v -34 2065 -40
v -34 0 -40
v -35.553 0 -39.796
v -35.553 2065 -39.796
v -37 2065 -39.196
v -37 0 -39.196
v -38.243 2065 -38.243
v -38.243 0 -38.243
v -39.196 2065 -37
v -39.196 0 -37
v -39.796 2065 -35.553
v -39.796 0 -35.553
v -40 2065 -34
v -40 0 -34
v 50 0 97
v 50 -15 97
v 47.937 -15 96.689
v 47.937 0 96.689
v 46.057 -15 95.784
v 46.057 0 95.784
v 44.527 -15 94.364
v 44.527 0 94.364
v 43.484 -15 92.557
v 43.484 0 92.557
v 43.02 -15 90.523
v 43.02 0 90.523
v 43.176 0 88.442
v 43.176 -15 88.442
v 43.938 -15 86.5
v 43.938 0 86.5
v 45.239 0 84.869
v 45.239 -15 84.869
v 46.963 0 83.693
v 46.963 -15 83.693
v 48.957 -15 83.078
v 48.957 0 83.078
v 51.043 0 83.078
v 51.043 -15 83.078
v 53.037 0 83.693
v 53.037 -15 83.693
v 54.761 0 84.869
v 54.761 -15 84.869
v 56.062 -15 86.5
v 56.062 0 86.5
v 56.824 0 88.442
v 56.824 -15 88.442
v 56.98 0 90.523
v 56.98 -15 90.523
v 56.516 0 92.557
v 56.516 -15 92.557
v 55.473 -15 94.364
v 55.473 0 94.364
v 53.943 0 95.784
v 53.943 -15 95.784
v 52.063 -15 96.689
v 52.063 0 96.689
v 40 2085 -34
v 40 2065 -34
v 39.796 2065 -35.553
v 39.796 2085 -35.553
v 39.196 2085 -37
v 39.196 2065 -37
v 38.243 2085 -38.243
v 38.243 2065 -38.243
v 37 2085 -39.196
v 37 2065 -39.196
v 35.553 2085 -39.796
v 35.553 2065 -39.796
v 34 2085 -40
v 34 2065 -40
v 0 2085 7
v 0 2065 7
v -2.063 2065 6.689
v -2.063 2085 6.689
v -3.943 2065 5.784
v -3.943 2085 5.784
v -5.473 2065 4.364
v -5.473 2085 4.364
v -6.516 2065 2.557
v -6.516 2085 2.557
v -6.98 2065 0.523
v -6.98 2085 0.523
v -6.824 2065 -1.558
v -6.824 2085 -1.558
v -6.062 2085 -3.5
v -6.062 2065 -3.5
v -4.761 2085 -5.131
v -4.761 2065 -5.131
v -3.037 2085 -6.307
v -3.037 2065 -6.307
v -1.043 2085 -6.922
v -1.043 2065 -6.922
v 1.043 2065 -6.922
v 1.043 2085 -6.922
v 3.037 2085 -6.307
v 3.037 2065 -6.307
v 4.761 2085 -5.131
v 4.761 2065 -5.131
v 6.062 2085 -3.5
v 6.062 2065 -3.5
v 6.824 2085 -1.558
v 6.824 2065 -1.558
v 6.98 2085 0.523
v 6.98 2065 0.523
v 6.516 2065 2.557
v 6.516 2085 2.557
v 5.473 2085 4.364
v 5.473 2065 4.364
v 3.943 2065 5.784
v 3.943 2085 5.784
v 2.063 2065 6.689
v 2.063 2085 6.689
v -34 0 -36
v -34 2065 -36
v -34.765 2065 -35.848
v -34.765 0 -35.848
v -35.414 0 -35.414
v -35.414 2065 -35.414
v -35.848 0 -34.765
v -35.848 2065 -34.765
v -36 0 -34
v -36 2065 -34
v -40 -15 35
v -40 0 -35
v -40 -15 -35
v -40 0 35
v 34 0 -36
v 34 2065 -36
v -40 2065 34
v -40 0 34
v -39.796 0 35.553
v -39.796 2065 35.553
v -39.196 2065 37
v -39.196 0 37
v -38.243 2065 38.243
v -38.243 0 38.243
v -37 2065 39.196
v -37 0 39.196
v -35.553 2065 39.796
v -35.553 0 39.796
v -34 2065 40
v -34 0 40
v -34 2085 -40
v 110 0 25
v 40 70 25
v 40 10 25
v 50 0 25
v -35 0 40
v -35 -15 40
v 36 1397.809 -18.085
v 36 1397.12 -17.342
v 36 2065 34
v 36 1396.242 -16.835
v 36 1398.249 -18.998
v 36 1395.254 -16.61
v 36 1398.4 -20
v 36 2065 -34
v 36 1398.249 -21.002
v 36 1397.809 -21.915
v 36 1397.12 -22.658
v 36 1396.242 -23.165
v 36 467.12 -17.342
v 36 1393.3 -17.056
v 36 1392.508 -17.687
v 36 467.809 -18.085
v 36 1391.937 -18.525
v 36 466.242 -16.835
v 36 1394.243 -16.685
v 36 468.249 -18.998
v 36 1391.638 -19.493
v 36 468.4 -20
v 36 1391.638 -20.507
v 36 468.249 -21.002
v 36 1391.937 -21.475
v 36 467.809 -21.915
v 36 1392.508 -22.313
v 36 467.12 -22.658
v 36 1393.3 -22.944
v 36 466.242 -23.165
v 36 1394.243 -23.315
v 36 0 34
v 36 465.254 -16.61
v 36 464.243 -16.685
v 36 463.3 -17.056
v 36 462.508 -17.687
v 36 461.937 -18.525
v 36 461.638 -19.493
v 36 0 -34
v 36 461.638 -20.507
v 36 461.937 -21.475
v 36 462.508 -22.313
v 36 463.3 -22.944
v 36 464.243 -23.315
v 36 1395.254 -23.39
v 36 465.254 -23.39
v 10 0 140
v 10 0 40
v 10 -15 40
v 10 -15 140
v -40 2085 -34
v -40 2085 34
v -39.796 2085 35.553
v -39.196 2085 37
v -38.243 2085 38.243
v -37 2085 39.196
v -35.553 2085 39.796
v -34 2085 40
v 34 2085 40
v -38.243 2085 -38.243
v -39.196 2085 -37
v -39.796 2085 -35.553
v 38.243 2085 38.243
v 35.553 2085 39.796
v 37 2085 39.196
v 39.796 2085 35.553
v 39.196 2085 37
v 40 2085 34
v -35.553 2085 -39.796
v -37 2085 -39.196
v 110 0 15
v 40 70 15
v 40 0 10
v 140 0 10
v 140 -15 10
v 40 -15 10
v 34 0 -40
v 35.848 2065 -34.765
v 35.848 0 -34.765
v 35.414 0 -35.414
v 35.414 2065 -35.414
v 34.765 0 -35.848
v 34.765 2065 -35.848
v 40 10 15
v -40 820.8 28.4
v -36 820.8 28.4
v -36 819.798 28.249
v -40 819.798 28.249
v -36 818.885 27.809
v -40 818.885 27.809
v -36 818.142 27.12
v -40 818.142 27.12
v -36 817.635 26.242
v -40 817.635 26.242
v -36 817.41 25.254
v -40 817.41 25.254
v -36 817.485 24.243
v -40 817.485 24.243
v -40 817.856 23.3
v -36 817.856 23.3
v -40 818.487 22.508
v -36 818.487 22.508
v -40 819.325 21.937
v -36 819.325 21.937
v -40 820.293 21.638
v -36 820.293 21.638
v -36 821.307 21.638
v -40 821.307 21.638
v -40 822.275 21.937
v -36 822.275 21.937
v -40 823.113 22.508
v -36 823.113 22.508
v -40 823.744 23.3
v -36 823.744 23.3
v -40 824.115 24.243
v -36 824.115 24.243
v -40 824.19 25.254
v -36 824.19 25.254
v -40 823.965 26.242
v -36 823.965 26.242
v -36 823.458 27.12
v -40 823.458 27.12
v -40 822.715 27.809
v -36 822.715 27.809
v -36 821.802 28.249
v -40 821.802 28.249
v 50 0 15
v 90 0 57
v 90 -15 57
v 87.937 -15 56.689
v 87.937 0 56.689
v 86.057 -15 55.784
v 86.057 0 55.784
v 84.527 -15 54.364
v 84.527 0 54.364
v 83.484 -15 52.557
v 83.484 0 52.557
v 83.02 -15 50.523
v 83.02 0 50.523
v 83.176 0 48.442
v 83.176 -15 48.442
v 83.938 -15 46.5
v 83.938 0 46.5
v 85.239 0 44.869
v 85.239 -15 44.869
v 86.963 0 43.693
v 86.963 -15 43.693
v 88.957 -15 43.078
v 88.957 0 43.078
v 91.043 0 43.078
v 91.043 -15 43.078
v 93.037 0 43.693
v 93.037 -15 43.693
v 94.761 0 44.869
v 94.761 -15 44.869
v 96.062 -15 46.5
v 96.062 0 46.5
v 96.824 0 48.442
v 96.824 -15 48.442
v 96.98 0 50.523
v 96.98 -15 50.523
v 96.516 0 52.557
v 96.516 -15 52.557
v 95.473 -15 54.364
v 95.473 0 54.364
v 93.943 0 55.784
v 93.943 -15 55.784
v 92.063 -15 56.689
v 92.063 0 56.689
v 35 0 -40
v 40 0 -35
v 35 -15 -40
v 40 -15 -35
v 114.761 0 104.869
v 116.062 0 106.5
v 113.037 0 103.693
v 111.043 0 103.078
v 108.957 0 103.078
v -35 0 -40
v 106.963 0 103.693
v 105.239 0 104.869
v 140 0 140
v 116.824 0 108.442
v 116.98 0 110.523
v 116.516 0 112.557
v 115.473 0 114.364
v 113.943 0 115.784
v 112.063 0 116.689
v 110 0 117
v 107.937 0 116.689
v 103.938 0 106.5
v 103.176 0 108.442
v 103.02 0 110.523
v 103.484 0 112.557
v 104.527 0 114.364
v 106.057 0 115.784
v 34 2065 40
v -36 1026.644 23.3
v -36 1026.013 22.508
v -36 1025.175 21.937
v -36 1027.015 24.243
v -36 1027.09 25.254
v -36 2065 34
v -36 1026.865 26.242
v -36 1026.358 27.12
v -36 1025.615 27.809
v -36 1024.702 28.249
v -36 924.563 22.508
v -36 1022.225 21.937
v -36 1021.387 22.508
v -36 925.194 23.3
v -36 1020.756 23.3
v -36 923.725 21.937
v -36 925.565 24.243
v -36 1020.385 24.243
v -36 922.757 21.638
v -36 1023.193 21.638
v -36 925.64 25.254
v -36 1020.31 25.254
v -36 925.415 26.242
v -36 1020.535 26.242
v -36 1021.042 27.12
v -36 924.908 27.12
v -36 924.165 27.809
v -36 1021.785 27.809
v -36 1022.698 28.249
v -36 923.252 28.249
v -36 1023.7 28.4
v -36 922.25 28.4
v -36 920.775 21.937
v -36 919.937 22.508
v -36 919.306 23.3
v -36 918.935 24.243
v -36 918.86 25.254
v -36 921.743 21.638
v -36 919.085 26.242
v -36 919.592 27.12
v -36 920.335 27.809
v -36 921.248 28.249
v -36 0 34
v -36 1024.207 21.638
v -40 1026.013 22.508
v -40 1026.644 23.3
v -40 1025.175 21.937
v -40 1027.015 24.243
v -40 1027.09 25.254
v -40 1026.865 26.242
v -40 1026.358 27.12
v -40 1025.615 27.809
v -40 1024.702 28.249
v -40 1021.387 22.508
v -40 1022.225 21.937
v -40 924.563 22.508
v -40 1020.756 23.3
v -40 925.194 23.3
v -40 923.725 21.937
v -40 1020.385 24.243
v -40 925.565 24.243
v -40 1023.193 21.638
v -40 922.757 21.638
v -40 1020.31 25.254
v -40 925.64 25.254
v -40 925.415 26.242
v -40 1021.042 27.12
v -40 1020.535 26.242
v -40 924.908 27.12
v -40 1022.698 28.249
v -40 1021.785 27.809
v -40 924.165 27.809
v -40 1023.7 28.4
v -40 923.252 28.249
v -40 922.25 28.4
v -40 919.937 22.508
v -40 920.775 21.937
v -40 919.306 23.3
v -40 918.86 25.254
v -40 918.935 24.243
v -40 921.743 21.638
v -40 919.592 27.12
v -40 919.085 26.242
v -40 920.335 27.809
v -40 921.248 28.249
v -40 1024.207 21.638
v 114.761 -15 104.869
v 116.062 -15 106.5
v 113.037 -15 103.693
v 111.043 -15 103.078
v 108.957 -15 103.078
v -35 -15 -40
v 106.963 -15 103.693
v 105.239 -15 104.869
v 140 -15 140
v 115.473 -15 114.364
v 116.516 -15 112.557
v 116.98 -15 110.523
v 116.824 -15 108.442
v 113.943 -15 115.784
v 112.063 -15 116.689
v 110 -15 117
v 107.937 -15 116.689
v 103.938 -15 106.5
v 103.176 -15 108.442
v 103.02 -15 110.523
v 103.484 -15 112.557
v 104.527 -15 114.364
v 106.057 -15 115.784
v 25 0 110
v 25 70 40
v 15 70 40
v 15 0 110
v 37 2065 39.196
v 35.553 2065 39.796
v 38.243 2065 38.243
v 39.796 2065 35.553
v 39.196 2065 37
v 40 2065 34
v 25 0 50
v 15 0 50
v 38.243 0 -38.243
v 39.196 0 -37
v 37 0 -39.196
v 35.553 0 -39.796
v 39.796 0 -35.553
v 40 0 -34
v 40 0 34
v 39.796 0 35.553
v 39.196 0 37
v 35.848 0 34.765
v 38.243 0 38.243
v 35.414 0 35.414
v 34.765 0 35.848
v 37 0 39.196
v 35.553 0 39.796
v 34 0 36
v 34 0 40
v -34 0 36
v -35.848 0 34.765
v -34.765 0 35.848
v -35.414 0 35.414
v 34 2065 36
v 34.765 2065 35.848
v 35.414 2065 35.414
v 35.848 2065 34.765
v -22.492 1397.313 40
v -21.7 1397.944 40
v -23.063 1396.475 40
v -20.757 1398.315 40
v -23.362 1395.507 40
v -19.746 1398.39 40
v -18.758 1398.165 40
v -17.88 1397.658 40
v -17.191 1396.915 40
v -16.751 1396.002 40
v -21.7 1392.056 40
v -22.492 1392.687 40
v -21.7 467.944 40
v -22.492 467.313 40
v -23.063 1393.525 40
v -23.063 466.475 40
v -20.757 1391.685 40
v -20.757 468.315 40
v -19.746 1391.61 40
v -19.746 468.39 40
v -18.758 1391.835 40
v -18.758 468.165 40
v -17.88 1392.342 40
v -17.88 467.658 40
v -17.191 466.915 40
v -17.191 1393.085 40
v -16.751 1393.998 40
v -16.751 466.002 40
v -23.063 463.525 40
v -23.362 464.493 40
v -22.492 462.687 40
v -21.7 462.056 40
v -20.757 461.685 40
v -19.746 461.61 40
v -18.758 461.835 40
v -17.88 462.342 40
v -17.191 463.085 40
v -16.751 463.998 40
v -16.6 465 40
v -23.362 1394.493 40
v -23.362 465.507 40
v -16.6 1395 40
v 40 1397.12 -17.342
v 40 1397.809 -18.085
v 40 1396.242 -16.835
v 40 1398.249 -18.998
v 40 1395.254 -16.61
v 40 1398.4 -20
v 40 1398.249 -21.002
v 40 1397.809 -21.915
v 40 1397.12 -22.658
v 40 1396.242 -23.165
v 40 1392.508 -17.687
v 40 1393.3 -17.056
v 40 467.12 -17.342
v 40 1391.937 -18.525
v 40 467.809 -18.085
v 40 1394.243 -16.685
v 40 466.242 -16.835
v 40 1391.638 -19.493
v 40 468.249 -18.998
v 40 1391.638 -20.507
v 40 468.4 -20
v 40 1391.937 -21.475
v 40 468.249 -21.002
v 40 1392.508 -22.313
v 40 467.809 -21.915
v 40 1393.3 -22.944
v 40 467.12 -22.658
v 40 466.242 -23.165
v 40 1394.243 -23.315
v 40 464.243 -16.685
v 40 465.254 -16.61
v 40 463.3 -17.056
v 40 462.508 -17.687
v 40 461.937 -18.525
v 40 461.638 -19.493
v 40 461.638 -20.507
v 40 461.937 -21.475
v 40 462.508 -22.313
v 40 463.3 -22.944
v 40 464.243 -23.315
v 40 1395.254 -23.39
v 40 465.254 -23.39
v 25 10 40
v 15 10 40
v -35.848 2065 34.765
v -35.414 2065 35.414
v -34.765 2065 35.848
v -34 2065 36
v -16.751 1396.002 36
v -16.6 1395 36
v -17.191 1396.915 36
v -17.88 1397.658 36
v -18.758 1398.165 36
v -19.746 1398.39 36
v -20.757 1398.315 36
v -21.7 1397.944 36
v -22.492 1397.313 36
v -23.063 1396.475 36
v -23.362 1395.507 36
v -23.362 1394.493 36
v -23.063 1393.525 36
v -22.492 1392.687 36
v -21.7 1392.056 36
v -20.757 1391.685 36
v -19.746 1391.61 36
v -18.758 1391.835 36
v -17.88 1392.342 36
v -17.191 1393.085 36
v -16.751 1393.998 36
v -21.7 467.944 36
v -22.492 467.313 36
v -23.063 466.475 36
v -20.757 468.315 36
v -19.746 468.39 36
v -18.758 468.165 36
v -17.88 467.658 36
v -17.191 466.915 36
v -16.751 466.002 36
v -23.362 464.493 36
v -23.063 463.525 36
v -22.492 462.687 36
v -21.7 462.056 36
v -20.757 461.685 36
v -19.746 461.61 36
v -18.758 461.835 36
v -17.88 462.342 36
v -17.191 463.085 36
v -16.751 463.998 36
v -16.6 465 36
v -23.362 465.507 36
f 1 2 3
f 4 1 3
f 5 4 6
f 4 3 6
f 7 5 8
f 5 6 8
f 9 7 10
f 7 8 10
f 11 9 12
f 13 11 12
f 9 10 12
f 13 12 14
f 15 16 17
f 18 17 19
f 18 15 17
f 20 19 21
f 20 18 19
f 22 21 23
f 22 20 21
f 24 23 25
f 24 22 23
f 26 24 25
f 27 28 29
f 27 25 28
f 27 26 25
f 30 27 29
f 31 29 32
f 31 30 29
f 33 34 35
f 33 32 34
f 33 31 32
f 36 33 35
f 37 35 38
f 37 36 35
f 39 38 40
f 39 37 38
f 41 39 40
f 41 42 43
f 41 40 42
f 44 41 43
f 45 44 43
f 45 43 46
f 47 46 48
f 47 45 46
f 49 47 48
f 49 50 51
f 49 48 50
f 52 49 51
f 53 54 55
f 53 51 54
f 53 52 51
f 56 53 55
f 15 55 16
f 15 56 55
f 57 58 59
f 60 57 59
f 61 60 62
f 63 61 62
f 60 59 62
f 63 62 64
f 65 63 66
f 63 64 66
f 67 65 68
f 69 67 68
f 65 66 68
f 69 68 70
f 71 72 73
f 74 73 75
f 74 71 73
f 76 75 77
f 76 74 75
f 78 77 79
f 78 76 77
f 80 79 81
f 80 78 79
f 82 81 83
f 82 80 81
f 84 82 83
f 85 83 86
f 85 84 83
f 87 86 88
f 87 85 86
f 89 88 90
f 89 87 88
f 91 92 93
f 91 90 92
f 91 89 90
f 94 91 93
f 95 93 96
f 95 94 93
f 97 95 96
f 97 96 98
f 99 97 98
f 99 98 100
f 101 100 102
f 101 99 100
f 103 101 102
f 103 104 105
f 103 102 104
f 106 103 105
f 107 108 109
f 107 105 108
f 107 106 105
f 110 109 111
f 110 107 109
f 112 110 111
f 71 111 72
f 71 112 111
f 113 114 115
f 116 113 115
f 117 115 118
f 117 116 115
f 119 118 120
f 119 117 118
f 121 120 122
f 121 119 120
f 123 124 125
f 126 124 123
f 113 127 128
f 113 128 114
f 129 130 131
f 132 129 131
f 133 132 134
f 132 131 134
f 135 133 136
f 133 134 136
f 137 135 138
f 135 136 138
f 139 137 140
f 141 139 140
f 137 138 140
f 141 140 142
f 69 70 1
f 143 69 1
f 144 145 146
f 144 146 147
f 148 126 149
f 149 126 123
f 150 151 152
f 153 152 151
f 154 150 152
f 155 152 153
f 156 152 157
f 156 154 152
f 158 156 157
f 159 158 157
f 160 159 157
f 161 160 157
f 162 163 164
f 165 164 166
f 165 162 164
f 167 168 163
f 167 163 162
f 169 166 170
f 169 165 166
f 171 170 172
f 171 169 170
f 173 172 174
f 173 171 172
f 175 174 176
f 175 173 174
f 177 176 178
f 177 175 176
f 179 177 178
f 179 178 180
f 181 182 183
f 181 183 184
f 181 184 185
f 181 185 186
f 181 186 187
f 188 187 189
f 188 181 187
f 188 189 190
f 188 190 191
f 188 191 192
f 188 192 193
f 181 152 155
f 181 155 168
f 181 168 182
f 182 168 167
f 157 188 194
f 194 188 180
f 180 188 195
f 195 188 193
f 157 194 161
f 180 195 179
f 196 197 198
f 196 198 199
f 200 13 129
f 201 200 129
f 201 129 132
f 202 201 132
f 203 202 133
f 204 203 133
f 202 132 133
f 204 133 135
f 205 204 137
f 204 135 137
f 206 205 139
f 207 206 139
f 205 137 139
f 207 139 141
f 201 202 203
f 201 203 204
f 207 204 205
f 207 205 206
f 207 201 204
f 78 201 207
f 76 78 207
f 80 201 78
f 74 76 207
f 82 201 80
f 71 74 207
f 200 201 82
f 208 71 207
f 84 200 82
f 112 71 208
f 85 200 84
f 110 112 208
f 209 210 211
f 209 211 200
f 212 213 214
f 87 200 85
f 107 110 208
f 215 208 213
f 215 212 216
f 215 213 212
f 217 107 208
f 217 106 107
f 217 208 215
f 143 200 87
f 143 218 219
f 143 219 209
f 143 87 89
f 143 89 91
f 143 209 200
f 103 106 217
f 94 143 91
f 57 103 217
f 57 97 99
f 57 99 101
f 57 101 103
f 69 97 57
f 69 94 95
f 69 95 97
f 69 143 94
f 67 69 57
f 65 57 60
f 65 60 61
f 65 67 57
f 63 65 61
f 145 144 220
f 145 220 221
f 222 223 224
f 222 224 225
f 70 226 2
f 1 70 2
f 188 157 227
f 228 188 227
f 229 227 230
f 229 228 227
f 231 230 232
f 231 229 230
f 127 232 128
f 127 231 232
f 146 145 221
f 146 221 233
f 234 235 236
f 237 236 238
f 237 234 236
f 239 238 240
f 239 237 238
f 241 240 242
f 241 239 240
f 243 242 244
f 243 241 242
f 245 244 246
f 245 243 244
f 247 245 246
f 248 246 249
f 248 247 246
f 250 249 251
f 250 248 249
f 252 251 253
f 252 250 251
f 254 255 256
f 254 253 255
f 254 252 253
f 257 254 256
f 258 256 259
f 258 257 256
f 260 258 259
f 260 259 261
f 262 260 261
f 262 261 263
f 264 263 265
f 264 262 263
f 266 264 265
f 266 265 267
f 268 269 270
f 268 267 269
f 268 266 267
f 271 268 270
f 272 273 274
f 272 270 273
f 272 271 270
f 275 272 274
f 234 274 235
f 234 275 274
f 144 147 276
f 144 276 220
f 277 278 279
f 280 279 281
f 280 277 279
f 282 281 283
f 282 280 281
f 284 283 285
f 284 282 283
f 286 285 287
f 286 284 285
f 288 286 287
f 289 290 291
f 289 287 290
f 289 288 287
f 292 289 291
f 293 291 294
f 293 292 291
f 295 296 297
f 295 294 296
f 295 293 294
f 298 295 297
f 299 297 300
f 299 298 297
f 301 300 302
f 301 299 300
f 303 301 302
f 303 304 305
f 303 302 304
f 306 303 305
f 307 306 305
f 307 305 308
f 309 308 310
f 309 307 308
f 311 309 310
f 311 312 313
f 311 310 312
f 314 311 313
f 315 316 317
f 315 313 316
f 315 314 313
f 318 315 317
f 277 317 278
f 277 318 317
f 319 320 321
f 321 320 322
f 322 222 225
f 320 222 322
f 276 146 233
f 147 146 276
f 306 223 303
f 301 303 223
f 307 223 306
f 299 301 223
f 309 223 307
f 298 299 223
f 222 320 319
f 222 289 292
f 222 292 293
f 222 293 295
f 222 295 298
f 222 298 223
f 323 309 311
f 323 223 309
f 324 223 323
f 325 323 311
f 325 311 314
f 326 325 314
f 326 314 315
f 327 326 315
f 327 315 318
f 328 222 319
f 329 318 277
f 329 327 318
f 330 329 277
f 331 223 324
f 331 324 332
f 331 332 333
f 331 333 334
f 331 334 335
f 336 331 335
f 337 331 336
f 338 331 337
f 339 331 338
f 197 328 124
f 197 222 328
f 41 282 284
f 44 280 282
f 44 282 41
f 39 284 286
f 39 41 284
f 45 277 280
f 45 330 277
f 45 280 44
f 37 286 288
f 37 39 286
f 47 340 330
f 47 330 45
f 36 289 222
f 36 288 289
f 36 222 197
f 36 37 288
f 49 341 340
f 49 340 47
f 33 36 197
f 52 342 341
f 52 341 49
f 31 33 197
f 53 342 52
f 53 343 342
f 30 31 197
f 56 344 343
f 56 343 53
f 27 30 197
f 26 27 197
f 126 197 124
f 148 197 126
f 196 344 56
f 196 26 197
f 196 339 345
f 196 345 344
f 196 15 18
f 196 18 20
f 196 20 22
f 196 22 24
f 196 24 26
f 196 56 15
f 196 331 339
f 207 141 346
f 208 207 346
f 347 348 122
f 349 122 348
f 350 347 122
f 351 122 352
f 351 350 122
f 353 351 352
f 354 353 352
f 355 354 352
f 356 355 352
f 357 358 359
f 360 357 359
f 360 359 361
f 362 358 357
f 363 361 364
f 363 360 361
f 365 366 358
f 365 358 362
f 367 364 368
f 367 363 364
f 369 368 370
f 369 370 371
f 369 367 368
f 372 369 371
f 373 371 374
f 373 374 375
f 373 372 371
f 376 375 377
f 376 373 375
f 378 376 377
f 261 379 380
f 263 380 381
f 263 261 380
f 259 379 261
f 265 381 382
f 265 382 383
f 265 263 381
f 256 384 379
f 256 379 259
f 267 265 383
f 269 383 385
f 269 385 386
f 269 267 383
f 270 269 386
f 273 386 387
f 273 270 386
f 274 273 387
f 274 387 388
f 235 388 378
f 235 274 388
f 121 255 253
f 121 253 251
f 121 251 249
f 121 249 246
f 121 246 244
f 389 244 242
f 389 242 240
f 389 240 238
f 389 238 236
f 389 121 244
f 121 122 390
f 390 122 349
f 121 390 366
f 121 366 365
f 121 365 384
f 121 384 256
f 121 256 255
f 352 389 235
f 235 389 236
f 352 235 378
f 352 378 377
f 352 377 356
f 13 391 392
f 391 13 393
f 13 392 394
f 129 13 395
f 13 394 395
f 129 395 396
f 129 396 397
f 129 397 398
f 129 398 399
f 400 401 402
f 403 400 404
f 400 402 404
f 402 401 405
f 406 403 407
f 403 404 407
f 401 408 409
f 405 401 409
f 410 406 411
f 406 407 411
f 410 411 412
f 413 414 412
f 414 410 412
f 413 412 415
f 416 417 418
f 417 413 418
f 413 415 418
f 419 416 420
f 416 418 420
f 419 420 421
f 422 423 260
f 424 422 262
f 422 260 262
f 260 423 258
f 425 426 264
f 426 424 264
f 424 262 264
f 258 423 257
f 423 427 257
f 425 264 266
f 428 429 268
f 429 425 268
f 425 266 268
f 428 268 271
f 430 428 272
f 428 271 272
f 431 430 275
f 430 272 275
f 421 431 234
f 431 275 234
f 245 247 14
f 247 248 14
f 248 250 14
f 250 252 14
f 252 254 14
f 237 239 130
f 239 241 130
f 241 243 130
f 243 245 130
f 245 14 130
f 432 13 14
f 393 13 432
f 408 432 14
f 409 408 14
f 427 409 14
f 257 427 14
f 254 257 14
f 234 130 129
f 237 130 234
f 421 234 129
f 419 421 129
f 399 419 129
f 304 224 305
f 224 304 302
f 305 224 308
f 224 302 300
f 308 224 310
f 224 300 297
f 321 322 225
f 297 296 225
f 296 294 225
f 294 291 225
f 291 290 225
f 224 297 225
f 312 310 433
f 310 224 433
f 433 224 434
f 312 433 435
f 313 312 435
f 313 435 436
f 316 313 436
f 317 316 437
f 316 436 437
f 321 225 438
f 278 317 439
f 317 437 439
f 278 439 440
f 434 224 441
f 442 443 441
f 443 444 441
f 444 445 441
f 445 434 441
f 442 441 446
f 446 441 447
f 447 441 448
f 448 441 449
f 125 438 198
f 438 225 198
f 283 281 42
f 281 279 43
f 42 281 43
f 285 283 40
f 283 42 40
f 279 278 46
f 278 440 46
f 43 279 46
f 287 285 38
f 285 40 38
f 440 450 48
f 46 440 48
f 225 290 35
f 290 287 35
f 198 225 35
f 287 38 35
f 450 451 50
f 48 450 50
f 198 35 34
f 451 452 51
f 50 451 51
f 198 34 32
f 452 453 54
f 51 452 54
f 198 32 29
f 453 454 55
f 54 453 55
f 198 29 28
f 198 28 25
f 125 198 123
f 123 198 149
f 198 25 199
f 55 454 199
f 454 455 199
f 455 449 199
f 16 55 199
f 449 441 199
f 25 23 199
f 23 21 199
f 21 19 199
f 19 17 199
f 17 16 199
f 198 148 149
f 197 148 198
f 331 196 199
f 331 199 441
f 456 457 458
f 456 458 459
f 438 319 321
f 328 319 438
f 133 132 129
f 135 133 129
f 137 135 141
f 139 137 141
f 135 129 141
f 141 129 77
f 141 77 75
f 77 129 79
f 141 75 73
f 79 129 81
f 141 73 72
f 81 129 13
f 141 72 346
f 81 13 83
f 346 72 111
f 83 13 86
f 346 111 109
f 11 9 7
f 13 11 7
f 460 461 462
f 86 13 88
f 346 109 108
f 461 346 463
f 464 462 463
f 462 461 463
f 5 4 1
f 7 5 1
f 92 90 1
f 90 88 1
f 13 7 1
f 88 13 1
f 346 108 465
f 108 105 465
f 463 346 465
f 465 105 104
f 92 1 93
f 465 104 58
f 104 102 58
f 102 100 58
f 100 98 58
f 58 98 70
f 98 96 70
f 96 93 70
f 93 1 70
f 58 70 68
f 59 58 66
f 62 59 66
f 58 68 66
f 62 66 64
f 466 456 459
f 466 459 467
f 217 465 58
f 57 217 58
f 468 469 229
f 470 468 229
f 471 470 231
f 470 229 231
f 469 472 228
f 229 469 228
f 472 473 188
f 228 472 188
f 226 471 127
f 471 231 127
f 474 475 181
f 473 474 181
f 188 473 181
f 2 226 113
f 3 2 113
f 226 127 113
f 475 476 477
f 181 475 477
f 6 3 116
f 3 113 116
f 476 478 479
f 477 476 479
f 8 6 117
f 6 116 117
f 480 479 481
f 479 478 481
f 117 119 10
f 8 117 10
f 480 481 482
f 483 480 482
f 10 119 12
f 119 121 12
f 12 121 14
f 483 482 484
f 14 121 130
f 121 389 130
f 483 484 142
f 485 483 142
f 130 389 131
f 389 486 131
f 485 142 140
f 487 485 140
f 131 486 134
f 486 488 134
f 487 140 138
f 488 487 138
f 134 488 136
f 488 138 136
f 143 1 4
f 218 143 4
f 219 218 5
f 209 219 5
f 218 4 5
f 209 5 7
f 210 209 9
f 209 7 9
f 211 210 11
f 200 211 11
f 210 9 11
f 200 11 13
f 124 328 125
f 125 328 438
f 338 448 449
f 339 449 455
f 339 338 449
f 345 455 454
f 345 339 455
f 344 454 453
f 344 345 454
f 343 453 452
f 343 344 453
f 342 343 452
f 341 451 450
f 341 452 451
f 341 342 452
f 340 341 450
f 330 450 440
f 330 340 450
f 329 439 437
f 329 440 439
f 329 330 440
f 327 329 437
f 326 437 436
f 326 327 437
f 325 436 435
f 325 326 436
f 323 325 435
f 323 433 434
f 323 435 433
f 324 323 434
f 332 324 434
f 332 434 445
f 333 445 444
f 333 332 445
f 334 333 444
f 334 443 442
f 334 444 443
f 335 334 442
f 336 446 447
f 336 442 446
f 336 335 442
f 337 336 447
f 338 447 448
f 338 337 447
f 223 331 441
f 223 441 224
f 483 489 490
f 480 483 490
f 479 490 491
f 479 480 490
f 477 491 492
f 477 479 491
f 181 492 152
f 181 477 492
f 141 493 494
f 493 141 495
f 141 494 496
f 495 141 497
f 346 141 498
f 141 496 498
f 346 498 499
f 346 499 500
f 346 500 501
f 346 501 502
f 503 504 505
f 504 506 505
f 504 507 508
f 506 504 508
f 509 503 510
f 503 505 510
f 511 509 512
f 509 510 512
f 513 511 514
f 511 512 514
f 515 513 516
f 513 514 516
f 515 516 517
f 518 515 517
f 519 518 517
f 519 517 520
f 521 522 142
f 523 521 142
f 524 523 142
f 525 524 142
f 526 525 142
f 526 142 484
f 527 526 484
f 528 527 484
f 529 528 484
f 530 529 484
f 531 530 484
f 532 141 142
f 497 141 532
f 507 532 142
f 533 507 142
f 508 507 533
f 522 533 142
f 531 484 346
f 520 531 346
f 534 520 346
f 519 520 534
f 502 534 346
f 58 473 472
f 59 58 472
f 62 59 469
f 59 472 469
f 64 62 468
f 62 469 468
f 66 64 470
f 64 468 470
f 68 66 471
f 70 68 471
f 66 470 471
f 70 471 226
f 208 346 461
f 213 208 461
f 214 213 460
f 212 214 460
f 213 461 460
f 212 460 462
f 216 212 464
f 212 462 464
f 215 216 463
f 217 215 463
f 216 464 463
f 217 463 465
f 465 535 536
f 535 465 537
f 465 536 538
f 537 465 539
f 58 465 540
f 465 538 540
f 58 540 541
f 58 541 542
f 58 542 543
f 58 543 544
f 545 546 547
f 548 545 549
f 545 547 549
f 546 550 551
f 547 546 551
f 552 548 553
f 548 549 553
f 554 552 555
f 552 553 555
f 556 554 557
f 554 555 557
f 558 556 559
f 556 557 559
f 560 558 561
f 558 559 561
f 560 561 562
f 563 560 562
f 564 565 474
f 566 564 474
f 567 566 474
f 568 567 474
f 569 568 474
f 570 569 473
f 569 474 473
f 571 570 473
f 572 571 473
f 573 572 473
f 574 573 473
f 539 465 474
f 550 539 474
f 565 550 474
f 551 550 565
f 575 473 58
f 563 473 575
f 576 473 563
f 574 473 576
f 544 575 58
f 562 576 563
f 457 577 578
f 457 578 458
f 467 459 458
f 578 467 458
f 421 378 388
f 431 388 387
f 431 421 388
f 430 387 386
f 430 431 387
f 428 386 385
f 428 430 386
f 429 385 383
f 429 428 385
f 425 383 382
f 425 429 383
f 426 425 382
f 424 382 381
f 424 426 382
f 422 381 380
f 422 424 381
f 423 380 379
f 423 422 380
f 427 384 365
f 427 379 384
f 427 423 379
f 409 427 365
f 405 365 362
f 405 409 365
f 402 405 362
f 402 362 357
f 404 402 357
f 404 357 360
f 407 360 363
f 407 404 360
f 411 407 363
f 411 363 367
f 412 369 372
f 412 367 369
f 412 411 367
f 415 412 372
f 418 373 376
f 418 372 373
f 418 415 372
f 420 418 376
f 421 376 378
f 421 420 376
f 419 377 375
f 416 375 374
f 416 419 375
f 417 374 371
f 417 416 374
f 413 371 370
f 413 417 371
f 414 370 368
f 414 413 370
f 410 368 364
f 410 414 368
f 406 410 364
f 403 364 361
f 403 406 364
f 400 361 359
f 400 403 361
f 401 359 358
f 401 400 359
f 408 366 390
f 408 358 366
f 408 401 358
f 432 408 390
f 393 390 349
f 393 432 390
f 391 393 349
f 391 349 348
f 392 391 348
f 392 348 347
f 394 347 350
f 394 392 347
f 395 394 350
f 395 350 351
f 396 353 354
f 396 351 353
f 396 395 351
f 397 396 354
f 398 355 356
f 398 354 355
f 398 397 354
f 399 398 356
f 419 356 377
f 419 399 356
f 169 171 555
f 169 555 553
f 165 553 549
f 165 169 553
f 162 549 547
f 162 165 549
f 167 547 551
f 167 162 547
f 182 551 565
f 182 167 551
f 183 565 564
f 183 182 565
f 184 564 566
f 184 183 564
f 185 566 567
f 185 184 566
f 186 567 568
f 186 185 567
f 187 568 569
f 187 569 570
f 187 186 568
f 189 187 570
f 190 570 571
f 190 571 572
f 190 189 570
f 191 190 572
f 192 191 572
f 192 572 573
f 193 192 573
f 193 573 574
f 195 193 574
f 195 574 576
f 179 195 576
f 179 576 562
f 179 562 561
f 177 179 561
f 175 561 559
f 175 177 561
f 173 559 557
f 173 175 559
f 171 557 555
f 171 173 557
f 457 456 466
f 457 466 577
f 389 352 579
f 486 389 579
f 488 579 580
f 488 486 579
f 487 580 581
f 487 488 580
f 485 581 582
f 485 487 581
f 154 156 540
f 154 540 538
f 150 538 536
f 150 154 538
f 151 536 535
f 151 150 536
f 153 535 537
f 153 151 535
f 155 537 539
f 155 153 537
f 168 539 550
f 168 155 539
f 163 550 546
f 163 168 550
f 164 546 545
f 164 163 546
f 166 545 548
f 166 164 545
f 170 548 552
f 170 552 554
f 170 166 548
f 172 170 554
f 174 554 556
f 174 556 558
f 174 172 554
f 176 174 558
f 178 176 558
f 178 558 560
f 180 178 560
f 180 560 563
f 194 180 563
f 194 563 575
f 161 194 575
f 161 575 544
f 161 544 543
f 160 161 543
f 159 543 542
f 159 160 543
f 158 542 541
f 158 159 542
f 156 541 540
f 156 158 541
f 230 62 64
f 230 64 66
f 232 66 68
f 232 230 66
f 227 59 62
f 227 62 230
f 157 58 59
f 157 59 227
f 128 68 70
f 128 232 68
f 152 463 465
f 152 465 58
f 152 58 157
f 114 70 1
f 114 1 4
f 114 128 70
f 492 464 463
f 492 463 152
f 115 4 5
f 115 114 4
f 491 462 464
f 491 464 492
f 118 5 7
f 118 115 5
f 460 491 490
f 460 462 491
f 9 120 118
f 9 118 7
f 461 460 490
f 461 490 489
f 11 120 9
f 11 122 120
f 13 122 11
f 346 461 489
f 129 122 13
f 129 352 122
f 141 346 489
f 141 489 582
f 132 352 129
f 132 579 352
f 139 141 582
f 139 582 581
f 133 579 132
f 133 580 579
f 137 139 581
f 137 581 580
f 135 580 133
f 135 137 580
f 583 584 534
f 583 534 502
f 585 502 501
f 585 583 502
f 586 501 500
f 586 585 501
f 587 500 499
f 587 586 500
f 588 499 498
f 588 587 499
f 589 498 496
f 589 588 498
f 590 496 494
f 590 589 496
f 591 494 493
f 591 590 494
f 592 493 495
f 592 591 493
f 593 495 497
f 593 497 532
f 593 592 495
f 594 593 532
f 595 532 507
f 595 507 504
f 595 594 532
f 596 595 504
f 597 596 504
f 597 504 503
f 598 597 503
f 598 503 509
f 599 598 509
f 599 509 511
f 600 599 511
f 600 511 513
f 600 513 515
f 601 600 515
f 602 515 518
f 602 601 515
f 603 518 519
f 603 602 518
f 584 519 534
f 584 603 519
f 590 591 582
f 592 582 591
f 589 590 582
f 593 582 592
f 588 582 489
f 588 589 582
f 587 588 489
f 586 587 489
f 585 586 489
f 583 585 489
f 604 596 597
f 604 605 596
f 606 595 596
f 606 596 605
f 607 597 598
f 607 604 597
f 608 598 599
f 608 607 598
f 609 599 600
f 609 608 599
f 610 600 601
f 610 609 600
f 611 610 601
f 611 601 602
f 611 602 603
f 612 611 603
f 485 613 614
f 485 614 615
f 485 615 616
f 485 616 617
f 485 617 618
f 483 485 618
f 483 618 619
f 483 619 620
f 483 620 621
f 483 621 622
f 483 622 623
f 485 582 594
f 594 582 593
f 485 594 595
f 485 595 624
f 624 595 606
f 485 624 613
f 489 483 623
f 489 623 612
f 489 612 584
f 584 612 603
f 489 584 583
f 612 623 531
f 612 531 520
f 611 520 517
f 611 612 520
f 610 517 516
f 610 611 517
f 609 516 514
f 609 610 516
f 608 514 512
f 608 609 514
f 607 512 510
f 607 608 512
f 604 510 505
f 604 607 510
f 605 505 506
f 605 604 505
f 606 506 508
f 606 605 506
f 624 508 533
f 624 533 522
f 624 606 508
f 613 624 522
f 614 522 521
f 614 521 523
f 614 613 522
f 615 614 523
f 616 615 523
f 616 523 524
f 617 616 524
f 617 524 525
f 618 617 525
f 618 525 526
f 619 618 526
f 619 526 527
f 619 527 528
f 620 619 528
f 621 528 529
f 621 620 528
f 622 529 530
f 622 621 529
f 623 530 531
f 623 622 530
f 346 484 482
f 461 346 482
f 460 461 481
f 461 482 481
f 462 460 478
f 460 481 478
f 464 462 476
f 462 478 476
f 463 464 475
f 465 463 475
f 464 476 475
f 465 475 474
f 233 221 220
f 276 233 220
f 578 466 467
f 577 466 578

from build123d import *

# Parameters (mm, degrees)
MEMBER_1_DEPTH                   = 2065
EXTRUDE_1_DEPTH                  = 15
HOLE_WIZARD_14_0_14_1_AT_2_COUNT = 2
HOLE_WIZARD_14_0_14_1_AT_2_PITCH = 63.245553203
HOLE_WIZARD_14_0_14_1_AT_3_COUNT = 2
HOLE_WIZARD_14_0_14_1_AT_3_PITCH = 63.245553203
EXTRUDE_2_DEPTH                  = 10
EXTRUDE_3_DEPTH                  = 10
CHAMFER_1_SIZE                   = 5
EXTRUDE_6_DEPTH                  = 20
HOLE_START                       = 36
HOLE_WIZARD_M8_1_OUTLINE_R       = 3.4
HOLE_WIZARD_M8_1_DEPTH           = 4
HOLE_WIZARD_M8_2_OUTLINE_R       = 3.4
HOLE_WIZARD_M8_2_DEPTH           = 4
HOLE_WIZARD_M8_3_AT_2_COUNT      = 2
HOLE_WIZARD_M8_3_AT_2_PITCH      = 101.45
HOLE_WIZARD_M8_3_AT_3_COUNT      = 2
HOLE_WIZARD_M8_3_AT_3_PITCH      = 202.9


# Read off the part's stored shape, not the designer's step: M8 螺纹孔1, M8 螺纹孔2
with BuildPart() as part:
    # Sketch11 → Member 1 (new body)
    with BuildSketch(Plane(origin=(0, 0, 0), x_dir=(-1, 0, 0), z_dir=(0, 1, 0))):
        with BuildLine():
            Line((-34, -40), (34, -40))
            ThreePointArc((34, -40), (38.242640687, -38.242640687), (40, -34))
            Line((40, -34), (40, 34))
            ThreePointArc((40, 34), (38.242640687, 38.242640687), (34, 40))
            Line((34, 40), (-34, 40))
            ThreePointArc((-34, 40), (-38.242640687, 38.242640687), (-40, 34))
            Line((-40, 34), (-40, -34))
            ThreePointArc((-40, -34), (-38.242640687, -38.242640687), (-34, -40))
        make_face()
        with BuildLine():
            Line((-34, -36), (34, -36))
            ThreePointArc((34, -36), (35.414213562, -35.414213562), (36, -34))
            Line((36, -34), (36, 34))
            ThreePointArc((36, 34), (35.414213562, 35.414213562), (34, 36))
            Line((34, 36), (-34, 36))
            ThreePointArc((-34, 36), (-35.414213562, 35.414213562), (-36, 34))
            Line((-36, 34), (-36, -34))
            ThreePointArc((-36, -34), (-35.414213562, -35.414213562), (-34, -36))
        make_face(mode=Mode.SUBTRACT)
    extrude(amount=MEMBER_1_DEPTH)

    # M8 螺纹孔1 outline → M8 螺纹孔1 (cut)
    with BuildSketch(Plane.XY.offset(HOLE_START)):
        with Locations((-20, 465)):
            Circle(HOLE_WIZARD_M8_1_OUTLINE_R)
        with Locations((-20, 1395)):
            Circle(HOLE_WIZARD_M8_1_OUTLINE_R)
    extrude(amount=HOLE_WIZARD_M8_1_DEPTH, mode=Mode.SUBTRACT)

    # M8 螺纹孔2 outline → M8 螺纹孔2 (cut)
    with BuildSketch(Plane.YZ.offset(HOLE_START)):
        with Locations((465, -20.000000001)):
            Circle(HOLE_WIZARD_M8_2_OUTLINE_R)
        with Locations((1395, -20.000000001)):
            Circle(HOLE_WIZARD_M8_2_OUTLINE_R)
    extrude(amount=HOLE_WIZARD_M8_2_DEPTH, mode=Mode.SUBTRACT)

    # 草图33 → M8 螺纹孔3 (revolve, cut)
    with BuildSketch(Plane(origin=(-40, 820.8, 25), x_dir=(0, 0, 1), z_dir=(0, 1, 0))):
        Polygon((0, 0), (0, 24.292926105), (3.4, 22.25), (3.4, 0), align=None)
    hole_wizard_m8_3 = revolve(axis=Axis((-46.35, 820.8, 25), (1, 0, 0)), mode=Mode.SUBTRACT)

    # M8 螺纹孔3 at 2: M8 螺纹孔3 ×2
    with Locations(*[(0, i * HOLE_WIZARD_M8_3_AT_2_PITCH, 0) for i in range(1, HOLE_WIZARD_M8_3_AT_2_COUNT)]):
        add(hole_wizard_m8_3, mode=Mode.SUBTRACT)

    # M8 螺纹孔3 at 3: M8 螺纹孔3 ×2
    with Locations(*[(0, i * HOLE_WIZARD_M8_3_AT_3_PITCH, 0) for i in range(1, HOLE_WIZARD_M8_3_AT_3_COUNT)]):
        add(hole_wizard_m8_3, mode=Mode.SUBTRACT)


with BuildPart() as body_2:
    # 草图3 → 凸台-拉伸1 (new body)
    with BuildSketch(Plane.XZ):
        Polygon((10, 40), (10, 140), (140, 140), (140, 10), (40, 10), (40, -40), (-40, -40), (-40, 40), align=None)
    extrude(amount=EXTRUDE_1_DEPTH)

    # 草图4 → Ø14.0 (14) 直径孔1 (revolve, cut)
    with BuildSketch(Plane(origin=(110, 0, 110), x_dir=(0, 0, 1), z_dir=(1, 0, 0))):
        Polygon((0, 0), (0, 44.206024333), (7, 40), (7, 0), align=None)
    hole_wizard_14_0_14_1 = revolve(axis=Axis((110, 6.35, 110), (0, -1, 0)), mode=Mode.SUBTRACT)

    # Ø14.0 (14) 直径孔1 at 2: Ø14.0 (14) 直径孔1 ×2
    with Locations(*[Vector(-0.9486832980505139, 0, -0.316227766016838) * (i * HOLE_WIZARD_14_0_14_1_AT_2_PITCH) for i in range(1, HOLE_WIZARD_14_0_14_1_AT_2_COUNT)]):
        add(hole_wizard_14_0_14_1, mode=Mode.SUBTRACT)

    # Ø14.0 (14) 直径孔1 at 3: Ø14.0 (14) 直径孔1 ×2
    with Locations(*[Vector(-0.3162277660168379, 0, -0.9486832980505139) * (i * HOLE_WIZARD_14_0_14_1_AT_3_PITCH) for i in range(1, HOLE_WIZARD_14_0_14_1_AT_3_COUNT)]):
        add(hole_wizard_14_0_14_1, mode=Mode.SUBTRACT)

    # 倒角1
    chamfer_1_edges = [body_2.edges().sort_by_distance(p)[0] for p in [
        (-40, -7.5, 40),
        (40, -7.5, -40),
        (-40, -7.5, -40),
    ]]
    chamfer(chamfer_1_edges, length=CHAMFER_1_SIZE)


with BuildPart() as body_3:
    # 草图6 → 凸台-拉伸2 (new body)
    with BuildSketch(Plane.ZY.offset(-25)):
        Polygon((40, 70), (110, 0), (50, 0), (40, 10), align=None)
    extrude(amount=EXTRUDE_2_DEPTH)


with BuildPart() as body_4:
    # 草图7 → 凸台-拉伸3 (new body)
    with BuildSketch(Plane(origin=(0, 0, 25), x_dir=(-1, 0, 0), z_dir=(0, 0, -1))):
        Polygon((-40, 70), (-40, 10), (-50, 0), (-110, 0), align=None)
    extrude(amount=EXTRUDE_3_DEPTH)


with BuildPart() as body_5:
    # 草图26 → 凸台-拉伸6 (new body)
    with BuildSketch(Plane(origin=(0, 2065, 0), x_dir=(1, 0, 0), z_dir=(0, 1, 0))):
        with BuildLine():
            Line((-34, -40), (34, -40))
            ThreePointArc((34, -40), (38.242640687, -38.242640687), (40, -34))
            Line((40, -34), (40, 34))
            ThreePointArc((40, 34), (38.242640687, 38.242640687), (34, 40))
            Line((34, 40), (-34, 40))
            ThreePointArc((-34, 40), (-38.242640687, 38.242640687), (-40, 34))
            Line((-40, 34), (-40, -34))
            ThreePointArc((-40, -34), (-38.242640687, -38.242640687), (-34, -40))
        make_face()
    extrude(amount=EXTRUDE_6_DEPTH)

    # 草图27 → M16 螺纹孔1 (revolve, cut)
    with BuildSketch(Plane(origin=(0, 2085, 0), x_dir=(0, 0, 1), z_dir=(1, 0, 0))):
        Polygon((0, 0), (0, 46.206024333), (7, 42), (7, 0), align=None)
    revolve(axis=Axis((0, 2091.35, 0), (0, -1, 0)), mode=Mode.SUBTRACT)


solid = Compound([part.part, body_2.part, body_3.part, body_4.part, body_5.part])
